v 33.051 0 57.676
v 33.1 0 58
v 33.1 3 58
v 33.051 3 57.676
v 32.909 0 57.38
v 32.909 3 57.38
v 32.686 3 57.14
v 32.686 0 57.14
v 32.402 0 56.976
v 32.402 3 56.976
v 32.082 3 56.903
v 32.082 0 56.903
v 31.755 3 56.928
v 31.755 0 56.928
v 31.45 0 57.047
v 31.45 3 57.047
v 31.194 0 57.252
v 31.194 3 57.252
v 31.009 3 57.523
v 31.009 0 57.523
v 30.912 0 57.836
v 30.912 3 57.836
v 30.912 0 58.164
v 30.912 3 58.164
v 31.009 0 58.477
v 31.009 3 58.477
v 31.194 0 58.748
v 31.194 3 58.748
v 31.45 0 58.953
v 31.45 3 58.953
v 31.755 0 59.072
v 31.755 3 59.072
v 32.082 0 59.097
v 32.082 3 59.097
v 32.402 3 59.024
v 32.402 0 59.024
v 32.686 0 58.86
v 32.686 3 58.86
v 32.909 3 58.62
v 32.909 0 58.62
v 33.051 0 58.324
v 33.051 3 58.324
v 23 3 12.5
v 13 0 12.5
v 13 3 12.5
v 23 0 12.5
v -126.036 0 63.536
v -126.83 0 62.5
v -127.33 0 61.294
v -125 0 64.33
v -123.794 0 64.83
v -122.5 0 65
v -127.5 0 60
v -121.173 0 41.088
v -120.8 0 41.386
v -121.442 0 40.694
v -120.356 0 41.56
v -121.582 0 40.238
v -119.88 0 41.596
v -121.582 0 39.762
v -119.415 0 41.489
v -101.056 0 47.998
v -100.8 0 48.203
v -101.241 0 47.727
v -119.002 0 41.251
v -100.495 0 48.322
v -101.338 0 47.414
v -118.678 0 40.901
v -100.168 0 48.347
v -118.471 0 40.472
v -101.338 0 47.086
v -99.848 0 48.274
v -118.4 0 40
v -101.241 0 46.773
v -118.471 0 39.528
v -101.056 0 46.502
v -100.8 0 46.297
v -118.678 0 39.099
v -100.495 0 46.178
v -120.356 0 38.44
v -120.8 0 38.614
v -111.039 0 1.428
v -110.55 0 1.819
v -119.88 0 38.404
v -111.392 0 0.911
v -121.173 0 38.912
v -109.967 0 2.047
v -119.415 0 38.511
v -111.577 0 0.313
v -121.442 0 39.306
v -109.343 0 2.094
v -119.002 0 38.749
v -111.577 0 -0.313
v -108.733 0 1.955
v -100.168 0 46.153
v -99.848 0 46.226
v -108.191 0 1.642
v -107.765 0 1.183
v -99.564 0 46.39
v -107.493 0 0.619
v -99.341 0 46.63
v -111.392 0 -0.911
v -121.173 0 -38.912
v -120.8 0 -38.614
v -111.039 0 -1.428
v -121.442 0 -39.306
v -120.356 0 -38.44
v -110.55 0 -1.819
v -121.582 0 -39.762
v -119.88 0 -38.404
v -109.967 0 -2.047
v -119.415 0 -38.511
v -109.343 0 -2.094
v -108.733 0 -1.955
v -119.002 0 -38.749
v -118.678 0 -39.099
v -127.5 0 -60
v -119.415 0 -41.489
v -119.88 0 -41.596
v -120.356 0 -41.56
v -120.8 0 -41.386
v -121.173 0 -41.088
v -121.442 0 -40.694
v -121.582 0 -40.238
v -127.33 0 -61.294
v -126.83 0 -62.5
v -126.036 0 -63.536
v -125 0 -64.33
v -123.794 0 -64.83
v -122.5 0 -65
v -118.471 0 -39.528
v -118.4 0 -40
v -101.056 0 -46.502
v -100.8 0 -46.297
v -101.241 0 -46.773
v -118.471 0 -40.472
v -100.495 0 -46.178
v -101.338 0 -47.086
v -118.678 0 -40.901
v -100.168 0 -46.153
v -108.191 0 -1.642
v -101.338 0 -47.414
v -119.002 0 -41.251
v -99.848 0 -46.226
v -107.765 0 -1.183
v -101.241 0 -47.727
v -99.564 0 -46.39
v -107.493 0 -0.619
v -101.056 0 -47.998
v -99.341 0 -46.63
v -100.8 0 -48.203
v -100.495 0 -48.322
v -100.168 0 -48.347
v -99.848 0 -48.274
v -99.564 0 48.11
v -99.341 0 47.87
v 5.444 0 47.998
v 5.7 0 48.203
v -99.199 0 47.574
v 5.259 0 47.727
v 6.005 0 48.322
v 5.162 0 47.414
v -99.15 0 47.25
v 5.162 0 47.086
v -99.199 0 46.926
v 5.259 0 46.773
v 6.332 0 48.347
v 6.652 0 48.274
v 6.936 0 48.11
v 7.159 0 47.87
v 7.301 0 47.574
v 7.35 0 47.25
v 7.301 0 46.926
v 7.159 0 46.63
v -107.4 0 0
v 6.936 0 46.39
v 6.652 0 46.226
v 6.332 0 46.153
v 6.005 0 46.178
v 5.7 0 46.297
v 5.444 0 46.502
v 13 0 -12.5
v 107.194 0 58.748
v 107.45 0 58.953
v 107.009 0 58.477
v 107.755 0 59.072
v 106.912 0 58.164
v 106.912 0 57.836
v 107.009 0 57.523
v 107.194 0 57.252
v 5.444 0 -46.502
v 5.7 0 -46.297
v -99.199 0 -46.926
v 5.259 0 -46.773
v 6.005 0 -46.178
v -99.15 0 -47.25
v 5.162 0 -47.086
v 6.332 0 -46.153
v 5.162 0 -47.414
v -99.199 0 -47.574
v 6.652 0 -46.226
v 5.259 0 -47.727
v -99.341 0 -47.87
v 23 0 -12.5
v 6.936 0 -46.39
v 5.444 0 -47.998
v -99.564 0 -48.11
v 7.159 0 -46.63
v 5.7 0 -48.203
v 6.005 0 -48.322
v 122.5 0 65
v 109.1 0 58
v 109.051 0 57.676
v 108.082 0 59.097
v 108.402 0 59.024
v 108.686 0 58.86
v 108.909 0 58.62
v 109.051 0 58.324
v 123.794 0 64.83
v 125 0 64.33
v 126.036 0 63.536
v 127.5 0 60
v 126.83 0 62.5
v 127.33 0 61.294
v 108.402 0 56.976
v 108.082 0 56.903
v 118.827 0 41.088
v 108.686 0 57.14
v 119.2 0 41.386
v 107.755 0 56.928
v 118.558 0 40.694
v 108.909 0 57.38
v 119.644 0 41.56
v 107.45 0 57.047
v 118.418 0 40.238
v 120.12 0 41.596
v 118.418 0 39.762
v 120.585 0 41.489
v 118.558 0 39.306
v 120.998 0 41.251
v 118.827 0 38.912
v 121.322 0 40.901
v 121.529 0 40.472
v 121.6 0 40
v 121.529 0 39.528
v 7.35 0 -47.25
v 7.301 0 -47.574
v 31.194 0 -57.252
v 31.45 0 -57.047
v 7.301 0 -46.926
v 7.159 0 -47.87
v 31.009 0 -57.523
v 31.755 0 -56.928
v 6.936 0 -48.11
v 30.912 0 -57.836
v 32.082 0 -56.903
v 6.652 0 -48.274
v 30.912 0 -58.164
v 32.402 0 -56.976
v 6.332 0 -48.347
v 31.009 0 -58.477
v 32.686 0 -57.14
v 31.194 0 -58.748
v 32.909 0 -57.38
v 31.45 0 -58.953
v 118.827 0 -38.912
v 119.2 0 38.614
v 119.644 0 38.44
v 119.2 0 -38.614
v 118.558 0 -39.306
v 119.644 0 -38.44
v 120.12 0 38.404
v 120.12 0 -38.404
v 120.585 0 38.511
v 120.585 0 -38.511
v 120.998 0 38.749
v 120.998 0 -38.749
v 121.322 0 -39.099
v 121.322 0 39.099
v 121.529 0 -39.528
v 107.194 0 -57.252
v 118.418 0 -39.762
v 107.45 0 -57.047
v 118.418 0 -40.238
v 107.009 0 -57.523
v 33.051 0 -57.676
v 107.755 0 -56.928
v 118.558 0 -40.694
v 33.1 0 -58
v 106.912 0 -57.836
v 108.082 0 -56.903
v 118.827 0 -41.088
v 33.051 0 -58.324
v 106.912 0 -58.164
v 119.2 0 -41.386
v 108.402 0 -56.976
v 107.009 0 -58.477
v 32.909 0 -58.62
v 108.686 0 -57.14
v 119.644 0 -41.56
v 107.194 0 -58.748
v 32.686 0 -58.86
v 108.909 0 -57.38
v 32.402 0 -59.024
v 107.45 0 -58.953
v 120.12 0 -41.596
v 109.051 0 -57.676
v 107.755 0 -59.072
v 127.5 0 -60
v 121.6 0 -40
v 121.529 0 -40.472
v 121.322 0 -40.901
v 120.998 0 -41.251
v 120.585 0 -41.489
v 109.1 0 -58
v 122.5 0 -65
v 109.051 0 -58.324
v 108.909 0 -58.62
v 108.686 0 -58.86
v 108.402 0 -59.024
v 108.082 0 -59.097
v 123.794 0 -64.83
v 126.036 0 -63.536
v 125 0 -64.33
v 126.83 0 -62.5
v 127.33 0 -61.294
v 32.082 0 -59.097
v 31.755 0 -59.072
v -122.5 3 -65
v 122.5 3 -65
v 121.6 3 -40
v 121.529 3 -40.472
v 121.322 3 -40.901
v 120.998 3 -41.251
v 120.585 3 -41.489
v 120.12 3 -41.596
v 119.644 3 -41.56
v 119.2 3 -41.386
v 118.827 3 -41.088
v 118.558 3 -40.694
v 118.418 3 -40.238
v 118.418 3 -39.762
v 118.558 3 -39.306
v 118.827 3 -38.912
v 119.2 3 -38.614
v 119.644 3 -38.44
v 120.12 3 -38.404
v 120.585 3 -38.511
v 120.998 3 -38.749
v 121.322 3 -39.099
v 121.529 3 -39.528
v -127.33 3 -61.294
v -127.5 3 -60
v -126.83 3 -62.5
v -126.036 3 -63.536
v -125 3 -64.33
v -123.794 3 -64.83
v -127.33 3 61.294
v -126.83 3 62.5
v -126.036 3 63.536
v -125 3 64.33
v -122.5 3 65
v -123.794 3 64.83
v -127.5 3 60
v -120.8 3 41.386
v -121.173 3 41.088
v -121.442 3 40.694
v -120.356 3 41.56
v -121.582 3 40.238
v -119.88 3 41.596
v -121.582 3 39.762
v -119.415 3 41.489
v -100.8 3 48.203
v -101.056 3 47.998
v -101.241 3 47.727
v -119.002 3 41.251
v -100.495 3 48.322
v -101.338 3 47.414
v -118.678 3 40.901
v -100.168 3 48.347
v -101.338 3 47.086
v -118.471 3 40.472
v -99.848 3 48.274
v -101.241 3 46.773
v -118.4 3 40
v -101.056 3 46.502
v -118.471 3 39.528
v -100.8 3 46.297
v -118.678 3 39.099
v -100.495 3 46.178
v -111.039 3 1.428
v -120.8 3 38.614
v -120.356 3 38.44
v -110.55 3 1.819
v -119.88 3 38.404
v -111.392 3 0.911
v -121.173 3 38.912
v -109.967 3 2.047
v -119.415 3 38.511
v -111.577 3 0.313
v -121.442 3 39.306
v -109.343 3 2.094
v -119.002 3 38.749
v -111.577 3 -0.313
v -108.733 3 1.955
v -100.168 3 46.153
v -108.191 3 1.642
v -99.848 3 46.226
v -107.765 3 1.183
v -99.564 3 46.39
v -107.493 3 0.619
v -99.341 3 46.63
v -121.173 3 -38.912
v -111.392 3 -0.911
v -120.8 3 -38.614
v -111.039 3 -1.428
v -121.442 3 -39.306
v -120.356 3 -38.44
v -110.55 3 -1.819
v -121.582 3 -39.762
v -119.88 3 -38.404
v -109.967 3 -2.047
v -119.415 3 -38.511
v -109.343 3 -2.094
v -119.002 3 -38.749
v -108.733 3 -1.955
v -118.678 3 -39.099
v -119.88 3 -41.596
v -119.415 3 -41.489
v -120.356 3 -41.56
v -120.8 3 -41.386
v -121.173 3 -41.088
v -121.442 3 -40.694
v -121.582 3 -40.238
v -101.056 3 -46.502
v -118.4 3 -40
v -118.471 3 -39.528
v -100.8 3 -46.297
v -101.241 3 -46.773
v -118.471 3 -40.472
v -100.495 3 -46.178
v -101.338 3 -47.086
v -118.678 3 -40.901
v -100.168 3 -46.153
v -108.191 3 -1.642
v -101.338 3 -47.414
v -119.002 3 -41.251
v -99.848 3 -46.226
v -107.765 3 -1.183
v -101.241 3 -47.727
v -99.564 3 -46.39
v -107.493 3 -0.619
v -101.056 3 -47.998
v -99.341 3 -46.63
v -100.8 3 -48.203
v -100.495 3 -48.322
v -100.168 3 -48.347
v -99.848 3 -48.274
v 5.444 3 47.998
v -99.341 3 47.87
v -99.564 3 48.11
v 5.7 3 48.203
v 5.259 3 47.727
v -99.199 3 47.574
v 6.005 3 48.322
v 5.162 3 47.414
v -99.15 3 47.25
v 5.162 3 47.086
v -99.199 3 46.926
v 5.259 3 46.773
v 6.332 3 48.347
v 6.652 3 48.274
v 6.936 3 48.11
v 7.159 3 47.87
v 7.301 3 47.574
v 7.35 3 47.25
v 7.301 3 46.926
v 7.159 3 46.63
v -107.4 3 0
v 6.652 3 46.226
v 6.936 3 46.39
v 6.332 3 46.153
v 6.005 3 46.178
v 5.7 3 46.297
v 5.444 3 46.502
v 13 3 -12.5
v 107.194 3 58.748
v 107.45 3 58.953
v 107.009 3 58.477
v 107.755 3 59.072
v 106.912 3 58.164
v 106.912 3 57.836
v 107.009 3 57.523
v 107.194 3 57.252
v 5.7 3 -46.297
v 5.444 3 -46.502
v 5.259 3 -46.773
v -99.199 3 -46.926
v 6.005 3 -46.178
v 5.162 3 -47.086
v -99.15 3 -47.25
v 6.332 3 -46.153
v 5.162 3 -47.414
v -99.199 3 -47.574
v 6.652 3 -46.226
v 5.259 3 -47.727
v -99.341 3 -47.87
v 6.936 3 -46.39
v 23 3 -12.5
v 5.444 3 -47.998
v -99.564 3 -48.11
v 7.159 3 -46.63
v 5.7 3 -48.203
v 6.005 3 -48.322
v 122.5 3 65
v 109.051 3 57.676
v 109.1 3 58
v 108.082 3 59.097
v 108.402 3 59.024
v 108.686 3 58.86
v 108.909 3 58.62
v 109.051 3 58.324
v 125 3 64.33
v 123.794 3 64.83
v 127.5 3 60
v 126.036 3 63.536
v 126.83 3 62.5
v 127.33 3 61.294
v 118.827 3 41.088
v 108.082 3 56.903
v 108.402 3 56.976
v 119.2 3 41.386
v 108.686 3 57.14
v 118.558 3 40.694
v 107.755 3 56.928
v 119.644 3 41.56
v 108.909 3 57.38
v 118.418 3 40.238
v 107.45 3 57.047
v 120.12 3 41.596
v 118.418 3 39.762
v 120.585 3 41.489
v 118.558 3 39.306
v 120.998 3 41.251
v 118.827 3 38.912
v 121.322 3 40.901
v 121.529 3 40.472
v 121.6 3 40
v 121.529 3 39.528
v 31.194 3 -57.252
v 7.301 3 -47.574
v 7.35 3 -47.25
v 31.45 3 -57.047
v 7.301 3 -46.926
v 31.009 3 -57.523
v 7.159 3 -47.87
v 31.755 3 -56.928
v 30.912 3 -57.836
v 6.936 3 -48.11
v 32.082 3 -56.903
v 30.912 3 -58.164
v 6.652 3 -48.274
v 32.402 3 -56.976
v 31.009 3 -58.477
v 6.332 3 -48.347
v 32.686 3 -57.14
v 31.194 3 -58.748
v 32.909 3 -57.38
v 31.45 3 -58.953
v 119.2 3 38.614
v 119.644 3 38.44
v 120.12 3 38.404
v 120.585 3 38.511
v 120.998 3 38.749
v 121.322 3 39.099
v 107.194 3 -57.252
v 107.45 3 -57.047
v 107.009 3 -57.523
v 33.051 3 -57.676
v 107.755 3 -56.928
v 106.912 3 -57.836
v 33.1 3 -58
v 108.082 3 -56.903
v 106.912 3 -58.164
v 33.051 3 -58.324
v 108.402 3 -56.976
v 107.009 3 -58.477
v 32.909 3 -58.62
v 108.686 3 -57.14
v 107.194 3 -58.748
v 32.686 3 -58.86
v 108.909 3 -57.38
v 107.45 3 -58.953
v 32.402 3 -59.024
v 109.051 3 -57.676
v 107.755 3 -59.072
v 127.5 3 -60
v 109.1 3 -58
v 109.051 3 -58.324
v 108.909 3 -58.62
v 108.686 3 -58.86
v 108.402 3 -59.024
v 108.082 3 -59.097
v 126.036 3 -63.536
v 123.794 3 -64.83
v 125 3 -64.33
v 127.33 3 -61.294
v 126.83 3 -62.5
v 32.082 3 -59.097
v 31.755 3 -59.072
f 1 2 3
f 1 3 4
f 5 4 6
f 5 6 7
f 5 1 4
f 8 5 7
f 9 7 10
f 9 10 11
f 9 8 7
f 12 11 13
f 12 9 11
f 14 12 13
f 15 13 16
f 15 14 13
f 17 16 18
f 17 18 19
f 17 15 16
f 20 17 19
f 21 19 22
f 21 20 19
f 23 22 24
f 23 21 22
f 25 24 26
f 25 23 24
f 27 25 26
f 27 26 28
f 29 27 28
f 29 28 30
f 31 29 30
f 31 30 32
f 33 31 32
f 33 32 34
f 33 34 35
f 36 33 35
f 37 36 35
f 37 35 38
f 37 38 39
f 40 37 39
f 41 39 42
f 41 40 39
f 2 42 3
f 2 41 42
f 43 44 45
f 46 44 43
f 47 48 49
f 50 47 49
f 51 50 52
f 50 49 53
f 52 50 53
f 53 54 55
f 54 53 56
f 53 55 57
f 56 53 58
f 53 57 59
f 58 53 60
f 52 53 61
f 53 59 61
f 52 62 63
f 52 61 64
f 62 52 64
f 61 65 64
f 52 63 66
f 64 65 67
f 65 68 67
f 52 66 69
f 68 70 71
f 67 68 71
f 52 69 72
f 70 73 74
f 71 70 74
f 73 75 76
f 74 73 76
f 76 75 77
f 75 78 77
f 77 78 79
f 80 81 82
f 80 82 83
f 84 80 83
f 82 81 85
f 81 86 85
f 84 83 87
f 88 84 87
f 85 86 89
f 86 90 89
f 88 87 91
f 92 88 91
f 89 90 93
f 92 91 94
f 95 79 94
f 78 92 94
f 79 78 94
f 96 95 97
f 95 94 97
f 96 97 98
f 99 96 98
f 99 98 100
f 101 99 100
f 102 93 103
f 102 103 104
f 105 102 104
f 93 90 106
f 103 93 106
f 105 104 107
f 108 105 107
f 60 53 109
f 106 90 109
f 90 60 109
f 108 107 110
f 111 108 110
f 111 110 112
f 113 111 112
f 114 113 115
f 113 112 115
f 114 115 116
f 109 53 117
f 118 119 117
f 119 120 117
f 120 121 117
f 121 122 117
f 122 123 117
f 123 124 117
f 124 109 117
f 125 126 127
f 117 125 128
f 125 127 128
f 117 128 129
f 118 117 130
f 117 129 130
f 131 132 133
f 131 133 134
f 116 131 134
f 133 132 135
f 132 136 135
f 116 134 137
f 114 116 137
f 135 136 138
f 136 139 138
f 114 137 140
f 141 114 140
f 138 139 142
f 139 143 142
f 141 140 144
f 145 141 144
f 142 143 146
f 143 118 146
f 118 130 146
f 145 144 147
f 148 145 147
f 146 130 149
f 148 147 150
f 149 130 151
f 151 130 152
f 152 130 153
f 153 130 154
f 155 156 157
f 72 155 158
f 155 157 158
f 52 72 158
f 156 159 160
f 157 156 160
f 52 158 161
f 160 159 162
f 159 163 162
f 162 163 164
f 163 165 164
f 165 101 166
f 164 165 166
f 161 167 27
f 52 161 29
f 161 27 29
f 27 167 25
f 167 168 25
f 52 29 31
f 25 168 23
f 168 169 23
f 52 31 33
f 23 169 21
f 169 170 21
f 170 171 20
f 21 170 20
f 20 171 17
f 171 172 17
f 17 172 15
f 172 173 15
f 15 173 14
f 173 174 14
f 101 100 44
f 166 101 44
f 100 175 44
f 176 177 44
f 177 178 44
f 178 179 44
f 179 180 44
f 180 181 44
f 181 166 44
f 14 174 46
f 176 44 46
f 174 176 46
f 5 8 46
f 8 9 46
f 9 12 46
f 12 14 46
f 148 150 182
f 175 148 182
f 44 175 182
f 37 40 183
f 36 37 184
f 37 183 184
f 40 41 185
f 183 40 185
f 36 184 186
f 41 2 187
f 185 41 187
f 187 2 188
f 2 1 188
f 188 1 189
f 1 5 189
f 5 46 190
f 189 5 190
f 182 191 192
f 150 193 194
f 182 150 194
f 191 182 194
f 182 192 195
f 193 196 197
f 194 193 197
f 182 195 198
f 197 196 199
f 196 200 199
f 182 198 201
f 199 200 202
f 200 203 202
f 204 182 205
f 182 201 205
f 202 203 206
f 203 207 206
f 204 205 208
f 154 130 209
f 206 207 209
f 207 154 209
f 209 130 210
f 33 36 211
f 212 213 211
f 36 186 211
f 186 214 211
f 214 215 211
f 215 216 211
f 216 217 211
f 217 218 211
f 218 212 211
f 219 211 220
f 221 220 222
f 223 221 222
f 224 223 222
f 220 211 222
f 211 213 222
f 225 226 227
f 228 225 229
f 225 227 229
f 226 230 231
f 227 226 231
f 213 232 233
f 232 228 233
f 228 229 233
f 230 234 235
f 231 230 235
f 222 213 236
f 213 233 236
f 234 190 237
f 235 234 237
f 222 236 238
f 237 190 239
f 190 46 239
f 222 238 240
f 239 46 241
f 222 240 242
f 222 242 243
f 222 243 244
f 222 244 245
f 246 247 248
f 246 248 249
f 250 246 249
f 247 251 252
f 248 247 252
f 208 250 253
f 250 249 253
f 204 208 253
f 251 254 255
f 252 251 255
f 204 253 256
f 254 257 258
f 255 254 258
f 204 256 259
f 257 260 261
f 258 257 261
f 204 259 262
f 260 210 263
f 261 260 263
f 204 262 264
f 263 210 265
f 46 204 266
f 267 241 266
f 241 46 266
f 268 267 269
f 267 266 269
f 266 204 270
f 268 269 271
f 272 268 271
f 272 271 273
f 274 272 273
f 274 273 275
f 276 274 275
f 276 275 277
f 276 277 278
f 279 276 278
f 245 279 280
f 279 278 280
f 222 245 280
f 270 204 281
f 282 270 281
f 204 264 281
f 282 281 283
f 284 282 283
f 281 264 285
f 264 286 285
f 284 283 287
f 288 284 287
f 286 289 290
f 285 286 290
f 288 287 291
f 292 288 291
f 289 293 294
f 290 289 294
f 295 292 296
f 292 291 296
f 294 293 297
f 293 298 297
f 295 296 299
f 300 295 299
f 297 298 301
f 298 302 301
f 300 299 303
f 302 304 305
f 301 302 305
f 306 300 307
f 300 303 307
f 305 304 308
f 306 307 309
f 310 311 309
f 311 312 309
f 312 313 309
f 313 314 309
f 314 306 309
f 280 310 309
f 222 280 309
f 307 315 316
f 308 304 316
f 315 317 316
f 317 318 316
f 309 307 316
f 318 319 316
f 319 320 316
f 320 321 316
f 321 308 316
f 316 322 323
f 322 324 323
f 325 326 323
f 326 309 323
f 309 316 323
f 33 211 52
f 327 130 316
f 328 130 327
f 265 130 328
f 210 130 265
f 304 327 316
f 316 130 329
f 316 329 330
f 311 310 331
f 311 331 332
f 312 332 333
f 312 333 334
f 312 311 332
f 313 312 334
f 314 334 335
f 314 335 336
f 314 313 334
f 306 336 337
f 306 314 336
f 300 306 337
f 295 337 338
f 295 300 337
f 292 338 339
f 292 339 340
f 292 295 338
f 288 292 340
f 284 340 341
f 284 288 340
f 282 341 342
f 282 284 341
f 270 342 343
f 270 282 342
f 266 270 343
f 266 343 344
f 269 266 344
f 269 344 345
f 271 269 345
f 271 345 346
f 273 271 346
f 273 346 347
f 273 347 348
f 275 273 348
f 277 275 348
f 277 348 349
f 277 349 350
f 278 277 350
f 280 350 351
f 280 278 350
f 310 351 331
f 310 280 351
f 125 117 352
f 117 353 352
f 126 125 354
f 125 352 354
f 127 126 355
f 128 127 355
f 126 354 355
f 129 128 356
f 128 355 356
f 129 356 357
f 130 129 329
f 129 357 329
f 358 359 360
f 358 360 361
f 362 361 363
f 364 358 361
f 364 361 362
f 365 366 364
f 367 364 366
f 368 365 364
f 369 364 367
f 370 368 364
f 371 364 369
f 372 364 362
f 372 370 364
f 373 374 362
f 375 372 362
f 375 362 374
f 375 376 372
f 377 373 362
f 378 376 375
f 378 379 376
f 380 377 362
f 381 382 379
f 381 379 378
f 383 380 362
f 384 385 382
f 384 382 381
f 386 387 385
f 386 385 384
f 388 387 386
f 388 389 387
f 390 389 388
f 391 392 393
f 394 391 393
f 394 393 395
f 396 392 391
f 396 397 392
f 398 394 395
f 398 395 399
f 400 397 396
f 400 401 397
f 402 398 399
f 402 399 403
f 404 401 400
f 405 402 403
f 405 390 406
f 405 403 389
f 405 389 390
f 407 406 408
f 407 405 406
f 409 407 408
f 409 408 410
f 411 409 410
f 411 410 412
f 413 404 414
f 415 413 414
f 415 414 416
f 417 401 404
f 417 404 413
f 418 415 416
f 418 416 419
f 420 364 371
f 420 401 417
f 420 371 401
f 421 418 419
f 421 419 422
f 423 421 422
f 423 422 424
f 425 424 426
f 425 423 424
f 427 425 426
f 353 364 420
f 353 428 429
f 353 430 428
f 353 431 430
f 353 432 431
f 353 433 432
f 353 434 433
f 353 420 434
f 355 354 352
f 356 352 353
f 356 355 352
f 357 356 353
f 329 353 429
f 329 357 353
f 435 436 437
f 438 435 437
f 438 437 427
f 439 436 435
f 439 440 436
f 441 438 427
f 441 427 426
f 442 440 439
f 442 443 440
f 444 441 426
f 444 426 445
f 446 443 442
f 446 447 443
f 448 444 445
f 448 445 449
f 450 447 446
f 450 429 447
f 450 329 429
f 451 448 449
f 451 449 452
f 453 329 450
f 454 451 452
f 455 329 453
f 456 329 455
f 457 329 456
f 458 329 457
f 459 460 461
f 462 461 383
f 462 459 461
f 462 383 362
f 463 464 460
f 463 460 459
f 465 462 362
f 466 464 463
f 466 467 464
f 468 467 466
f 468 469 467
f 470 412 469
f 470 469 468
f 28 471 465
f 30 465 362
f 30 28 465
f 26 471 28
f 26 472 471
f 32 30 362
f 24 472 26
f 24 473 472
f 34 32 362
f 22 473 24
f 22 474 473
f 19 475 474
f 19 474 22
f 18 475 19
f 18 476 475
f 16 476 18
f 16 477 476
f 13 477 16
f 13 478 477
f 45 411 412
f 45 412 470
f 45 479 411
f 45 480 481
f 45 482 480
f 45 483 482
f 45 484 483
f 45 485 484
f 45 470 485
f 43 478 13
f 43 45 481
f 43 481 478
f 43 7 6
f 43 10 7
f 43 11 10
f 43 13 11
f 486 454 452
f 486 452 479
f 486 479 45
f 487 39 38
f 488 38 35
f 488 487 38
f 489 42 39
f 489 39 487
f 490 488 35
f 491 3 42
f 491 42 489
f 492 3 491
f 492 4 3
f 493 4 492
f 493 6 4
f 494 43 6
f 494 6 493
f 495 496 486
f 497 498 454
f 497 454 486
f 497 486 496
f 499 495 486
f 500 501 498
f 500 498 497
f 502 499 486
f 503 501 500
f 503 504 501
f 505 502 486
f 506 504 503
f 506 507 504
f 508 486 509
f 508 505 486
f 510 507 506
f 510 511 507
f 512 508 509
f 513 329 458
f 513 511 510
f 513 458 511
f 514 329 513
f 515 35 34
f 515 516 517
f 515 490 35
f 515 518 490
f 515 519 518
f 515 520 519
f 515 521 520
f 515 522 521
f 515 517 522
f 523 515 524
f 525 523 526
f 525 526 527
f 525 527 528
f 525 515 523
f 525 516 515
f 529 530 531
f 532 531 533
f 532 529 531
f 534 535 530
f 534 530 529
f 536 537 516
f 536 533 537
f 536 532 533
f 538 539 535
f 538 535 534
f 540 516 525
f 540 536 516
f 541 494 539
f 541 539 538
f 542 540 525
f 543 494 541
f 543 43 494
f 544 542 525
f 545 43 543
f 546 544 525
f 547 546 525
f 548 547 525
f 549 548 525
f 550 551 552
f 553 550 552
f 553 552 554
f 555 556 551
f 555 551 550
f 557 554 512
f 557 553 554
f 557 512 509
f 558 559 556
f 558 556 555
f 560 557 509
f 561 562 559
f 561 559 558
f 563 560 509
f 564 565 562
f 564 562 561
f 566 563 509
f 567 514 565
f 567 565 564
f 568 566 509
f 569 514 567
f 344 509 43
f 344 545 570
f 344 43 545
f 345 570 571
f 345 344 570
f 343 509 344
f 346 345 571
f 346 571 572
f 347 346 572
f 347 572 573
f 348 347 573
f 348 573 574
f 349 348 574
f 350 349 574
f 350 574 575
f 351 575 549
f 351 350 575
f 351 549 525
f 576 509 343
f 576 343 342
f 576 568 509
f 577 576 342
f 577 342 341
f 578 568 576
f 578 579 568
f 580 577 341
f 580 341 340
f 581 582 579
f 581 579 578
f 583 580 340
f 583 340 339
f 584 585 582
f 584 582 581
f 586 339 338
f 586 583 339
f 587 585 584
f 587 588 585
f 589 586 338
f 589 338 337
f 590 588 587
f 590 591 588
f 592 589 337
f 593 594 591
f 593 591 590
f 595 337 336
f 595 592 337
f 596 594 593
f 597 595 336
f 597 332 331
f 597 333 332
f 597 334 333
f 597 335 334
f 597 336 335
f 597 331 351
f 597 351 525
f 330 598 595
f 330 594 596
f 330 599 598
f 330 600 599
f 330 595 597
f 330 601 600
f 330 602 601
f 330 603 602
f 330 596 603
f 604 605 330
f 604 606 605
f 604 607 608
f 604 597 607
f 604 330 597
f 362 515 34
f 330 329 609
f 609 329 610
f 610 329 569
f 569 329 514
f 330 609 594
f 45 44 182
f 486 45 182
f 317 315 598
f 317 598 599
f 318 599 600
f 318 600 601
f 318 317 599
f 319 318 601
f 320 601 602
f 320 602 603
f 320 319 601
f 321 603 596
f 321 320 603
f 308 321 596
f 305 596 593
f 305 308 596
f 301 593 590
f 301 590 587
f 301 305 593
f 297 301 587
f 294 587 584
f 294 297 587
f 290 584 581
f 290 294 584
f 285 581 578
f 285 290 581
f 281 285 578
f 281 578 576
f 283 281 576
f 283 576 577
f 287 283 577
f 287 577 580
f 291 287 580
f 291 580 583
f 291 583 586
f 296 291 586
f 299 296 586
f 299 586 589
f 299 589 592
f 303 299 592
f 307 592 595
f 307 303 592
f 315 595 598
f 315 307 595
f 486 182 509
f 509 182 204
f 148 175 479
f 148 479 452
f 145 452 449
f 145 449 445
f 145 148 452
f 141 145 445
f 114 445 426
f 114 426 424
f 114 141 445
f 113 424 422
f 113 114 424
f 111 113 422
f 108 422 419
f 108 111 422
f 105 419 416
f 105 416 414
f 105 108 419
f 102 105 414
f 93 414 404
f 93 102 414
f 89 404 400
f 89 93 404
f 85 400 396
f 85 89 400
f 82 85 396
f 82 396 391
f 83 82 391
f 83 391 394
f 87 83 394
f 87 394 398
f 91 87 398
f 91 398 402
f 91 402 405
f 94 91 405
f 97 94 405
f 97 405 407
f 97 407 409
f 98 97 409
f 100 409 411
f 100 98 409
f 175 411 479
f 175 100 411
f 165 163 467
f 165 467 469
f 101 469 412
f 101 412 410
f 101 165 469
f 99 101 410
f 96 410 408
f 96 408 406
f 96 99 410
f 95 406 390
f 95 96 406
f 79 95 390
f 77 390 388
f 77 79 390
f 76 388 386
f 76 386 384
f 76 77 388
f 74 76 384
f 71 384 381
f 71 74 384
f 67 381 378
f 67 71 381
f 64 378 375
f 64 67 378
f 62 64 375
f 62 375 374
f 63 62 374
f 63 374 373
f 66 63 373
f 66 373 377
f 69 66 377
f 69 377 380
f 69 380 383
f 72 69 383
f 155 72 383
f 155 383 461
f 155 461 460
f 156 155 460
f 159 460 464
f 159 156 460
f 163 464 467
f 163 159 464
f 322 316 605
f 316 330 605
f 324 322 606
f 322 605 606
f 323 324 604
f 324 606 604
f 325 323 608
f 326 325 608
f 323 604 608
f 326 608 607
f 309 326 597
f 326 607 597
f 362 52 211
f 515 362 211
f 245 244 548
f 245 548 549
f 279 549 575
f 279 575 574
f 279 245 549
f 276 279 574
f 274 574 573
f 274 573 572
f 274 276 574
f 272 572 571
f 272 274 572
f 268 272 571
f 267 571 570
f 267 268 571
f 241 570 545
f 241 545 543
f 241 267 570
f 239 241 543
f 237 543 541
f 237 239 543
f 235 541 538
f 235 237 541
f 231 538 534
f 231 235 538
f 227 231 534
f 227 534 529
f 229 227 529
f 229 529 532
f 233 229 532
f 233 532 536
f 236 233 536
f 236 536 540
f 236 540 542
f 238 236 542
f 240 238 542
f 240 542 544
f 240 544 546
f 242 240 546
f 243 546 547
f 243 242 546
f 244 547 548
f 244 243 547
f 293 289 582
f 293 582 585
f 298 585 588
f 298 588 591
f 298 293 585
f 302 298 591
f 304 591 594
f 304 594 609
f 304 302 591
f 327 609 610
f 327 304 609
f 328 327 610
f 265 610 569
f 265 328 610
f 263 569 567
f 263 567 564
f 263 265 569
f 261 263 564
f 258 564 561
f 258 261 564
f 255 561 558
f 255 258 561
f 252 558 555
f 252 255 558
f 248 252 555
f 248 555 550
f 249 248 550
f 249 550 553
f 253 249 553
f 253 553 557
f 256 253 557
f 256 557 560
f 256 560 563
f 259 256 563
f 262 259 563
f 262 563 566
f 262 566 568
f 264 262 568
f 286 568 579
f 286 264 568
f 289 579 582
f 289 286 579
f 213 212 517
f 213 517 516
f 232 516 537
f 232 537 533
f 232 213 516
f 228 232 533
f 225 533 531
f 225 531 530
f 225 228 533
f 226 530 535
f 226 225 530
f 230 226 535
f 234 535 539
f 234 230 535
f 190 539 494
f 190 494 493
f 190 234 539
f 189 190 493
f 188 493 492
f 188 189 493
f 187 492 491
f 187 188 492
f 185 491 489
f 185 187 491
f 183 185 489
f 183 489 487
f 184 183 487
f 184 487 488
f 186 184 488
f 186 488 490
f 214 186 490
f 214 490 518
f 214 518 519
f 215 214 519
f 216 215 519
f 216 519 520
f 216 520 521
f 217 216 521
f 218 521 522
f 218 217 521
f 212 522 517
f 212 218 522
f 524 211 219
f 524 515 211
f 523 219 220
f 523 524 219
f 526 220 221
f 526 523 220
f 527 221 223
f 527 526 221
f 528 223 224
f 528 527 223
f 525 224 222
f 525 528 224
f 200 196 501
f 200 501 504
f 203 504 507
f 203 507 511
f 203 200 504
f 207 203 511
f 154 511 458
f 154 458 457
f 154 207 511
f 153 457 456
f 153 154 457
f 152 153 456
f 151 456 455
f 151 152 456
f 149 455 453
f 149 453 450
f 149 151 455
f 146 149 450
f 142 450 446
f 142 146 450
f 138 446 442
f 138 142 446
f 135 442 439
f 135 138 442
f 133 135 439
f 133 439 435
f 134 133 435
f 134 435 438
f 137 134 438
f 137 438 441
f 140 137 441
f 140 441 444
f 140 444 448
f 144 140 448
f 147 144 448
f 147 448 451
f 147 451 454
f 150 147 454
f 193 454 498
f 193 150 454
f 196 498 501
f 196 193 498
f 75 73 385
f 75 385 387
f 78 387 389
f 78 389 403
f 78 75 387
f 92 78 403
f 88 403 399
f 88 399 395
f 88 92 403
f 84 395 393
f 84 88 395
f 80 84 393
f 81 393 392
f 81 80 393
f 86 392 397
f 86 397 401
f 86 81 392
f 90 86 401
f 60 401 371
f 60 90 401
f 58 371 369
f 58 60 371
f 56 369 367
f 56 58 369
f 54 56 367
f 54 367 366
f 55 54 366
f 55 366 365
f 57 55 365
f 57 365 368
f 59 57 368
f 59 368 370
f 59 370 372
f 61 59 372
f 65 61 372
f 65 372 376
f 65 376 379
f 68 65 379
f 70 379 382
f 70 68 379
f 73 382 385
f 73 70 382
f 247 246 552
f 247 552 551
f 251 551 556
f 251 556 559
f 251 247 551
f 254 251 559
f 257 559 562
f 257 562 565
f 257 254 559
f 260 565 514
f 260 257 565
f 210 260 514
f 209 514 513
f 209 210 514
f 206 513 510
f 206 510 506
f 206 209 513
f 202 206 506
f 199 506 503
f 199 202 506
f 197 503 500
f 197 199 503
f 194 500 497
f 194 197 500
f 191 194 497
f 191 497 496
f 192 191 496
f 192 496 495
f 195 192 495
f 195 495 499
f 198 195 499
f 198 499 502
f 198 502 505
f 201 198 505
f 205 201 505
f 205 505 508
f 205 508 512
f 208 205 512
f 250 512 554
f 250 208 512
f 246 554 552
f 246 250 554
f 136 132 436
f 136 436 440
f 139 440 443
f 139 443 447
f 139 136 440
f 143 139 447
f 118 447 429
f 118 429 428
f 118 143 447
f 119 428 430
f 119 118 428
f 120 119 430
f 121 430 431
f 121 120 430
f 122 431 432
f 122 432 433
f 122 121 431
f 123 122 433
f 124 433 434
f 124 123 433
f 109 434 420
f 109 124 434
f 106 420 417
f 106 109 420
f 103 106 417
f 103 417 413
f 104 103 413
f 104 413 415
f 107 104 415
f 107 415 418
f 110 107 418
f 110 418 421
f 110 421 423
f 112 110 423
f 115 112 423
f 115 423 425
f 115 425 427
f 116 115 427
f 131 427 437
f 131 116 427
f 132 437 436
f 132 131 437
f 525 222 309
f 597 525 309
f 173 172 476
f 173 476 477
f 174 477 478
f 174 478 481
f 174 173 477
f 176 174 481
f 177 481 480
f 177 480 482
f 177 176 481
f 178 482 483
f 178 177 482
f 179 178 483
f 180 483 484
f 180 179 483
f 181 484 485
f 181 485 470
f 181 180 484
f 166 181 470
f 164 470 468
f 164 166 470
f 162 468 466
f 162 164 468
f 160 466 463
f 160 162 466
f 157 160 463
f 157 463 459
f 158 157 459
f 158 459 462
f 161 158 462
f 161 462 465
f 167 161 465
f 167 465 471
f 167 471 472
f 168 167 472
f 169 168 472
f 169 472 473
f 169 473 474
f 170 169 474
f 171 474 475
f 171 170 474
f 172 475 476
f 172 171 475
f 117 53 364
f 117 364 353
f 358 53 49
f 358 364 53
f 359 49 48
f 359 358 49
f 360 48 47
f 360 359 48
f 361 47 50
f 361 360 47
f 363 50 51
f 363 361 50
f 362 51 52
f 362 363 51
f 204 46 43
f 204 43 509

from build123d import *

# Parameters (mm, degrees)
SKETCH1_W           = 255
SKETCH1_H           = 130
SKETCH1_R           = 1.6
SKETCH1_R_2         = 1.1
SKETCH1_R_3         = 2.1
SKETCH1_W_2         = 10
SKETCH1_H_2         = 25
BOSS_EXTRUDE1_DEPTH = 3
FILLET1_R           = 5


with BuildPart() as part:
    # Sketch1 → Boss-Extrude1 (new body)
    with BuildSketch(Plane(origin=(0, 0, 0), x_dir=(1, 0, 0), z_dir=(0, 1, 0))):
        Rectangle(SKETCH1_W, SKETCH1_H)
        with Locations((120, -40)):
            Circle(SKETCH1_R, mode=Mode.SUBTRACT)
        with Locations((-120, -40)):
            Circle(SKETCH1_R, mode=Mode.SUBTRACT)
        with Locations((120, 40)):
            Circle(SKETCH1_R, mode=Mode.SUBTRACT)
        with Locations((-120, 40)):
            Circle(SKETCH1_R, mode=Mode.SUBTRACT)
        with Locations((32, -58)):
            Circle(SKETCH1_R_2, mode=Mode.SUBTRACT)
        with Locations((108, -58)):
            Circle(SKETCH1_R_2, mode=Mode.SUBTRACT)
        with Locations((108, 58)):
            Circle(SKETCH1_R_2, mode=Mode.SUBTRACT)
        with Locations((32, 58)):
            Circle(SKETCH1_R_2, mode=Mode.SUBTRACT)
        with Locations((-100.25, 47.25)):
            Circle(SKETCH1_R_2, mode=Mode.SUBTRACT)
        with Locations((6.25, 47.25)):
            Circle(SKETCH1_R_2, mode=Mode.SUBTRACT)
        with Locations((-100.25, -47.25)):
            Circle(SKETCH1_R_2, mode=Mode.SUBTRACT)
        with Locations((6.25, -47.25)):
            Circle(SKETCH1_R_2, mode=Mode.SUBTRACT)
        with Locations((-109.5, 0)):
            Circle(SKETCH1_R_3, mode=Mode.SUBTRACT)
        with Locations((18, 0)):
            Rectangle(SKETCH1_W_2, SKETCH1_H_2, mode=Mode.SUBTRACT)
    extrude(amount=BOSS_EXTRUDE1_DEPTH)

    # Fillet1
    fillet1_edges = [part.edges().sort_by_distance(p)[0] for p in [
        (127.5, 1.5, 65),
        (-127.5, 1.5, 65),
        (-127.5, 1.5, -65),
        (127.5, 1.5, -65),
    ]]
    fillet(fillet1_edges, radius=FILLET1_R)


solid = part.part
